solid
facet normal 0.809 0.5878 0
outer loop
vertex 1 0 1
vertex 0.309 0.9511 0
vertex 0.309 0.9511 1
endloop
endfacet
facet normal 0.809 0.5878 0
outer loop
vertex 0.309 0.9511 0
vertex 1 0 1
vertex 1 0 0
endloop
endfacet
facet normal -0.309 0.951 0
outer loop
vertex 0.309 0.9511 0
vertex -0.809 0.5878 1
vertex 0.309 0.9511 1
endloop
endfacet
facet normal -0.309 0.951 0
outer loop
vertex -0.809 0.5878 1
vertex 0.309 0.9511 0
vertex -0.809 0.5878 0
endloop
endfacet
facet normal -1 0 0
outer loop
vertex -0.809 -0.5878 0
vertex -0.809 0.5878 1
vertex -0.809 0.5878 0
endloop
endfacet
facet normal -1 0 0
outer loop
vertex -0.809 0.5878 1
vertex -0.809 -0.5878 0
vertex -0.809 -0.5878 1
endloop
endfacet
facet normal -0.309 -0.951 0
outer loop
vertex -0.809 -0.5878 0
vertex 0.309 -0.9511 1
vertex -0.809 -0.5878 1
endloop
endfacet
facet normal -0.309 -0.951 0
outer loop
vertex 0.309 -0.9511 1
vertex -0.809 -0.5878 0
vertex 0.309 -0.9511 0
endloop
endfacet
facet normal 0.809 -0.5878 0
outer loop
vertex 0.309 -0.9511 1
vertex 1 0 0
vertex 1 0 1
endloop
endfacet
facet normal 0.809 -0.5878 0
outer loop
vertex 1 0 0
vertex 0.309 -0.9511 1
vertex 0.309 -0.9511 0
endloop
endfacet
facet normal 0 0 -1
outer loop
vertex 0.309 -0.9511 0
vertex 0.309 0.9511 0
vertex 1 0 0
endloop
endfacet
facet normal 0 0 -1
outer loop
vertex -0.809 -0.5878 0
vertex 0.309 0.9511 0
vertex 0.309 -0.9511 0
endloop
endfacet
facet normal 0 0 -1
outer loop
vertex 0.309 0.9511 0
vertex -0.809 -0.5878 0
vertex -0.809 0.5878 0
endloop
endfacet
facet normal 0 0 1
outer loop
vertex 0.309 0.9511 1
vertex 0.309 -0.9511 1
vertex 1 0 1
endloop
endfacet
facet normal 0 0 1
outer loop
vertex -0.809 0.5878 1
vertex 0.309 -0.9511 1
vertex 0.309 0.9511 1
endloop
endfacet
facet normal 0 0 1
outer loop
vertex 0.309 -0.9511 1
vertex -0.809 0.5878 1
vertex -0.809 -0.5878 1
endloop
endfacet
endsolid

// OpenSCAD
function my_function(x = 1) = x;

module my_cylinder(r = my_function())
    cylinder();

my_cylinder();
